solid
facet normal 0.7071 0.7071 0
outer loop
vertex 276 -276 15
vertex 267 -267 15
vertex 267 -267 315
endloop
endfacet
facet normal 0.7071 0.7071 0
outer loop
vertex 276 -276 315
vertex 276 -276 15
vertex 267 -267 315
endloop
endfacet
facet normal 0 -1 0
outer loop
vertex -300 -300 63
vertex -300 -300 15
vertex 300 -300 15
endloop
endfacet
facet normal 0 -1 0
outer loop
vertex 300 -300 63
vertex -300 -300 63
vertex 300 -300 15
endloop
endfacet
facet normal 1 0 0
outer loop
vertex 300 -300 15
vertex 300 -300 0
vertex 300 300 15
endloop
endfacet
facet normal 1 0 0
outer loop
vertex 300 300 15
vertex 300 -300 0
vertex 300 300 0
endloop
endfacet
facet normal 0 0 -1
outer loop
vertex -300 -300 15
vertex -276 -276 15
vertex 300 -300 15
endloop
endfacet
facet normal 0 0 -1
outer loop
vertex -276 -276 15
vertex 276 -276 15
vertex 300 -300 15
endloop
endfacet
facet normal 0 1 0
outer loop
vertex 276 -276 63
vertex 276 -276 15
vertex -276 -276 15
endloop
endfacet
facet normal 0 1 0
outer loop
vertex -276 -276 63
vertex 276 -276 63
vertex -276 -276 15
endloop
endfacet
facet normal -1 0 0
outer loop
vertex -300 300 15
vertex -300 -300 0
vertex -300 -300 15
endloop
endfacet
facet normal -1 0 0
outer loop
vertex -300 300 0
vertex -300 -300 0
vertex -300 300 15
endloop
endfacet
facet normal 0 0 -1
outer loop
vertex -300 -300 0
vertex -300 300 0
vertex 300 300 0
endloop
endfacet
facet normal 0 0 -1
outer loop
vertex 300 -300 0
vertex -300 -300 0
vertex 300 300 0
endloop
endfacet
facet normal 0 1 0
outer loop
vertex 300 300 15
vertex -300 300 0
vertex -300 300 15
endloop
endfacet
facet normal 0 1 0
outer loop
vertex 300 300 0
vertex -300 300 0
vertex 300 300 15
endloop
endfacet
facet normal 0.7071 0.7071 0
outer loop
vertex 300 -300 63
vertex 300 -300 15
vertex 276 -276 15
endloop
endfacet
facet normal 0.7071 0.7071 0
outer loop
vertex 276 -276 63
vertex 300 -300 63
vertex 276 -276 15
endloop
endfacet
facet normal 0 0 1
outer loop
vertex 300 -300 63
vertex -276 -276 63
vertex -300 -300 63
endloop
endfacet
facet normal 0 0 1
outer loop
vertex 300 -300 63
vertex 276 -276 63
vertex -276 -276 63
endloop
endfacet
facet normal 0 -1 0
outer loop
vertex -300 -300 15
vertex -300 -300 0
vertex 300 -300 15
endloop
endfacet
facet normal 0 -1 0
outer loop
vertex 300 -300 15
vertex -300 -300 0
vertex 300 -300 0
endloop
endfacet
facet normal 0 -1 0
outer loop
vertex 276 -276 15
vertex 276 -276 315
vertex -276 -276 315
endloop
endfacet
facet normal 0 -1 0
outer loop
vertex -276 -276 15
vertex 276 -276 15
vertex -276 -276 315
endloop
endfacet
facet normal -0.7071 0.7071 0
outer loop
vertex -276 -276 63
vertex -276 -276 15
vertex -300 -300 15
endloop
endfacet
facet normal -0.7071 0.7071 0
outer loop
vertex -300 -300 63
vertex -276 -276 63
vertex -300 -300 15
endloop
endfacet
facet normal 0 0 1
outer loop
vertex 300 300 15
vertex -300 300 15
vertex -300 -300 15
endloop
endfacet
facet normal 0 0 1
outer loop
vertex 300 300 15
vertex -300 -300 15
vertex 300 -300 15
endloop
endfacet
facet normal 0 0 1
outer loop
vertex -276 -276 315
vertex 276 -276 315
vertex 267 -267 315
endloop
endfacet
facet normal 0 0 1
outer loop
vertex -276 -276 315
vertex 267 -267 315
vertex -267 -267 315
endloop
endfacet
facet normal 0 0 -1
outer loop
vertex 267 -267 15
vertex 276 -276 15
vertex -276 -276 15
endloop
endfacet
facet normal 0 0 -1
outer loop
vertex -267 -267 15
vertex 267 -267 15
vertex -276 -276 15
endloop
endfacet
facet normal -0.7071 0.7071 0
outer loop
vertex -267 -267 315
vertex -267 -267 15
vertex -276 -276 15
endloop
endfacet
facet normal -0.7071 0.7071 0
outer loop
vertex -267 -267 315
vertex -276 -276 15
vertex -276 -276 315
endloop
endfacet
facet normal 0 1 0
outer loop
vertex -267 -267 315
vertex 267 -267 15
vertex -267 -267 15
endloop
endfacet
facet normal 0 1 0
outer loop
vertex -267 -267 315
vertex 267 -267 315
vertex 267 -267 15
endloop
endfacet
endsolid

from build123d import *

# Parameters (mm, degrees)
F0_W     = 600
F0_H     = 600
F1_DEPTH = 15
F3_DEPTH = 48
F4_W     = 552
F4_H     = 300
F5_DEPTH = 9
F6_SIZE  = 8.99999


# Not quite as in the source:
# - a fillet or chamfer is up to 0.001 mm smaller than in the source, because OpenCascade refuses the exact size


with BuildPart() as f1:
    # F0 (on Top) → F1 (new body)
    with BuildSketch(Plane.XY):
        Rectangle(F0_W, F0_H)
    extrude(amount=F1_DEPTH)


with BuildPart() as f3:
    # F2 (on face) → F3 (new body)
    with BuildSketch(Plane.XY.offset(15)):
        Polygon((-276, -276), (-300, -300), (300, -300), (276, -276), align=None)
    extrude(amount=F3_DEPTH)


with BuildPart() as f5:
    # F4 (on face) → F5 (new body)
    with BuildSketch(Plane(origin=(0, -276, 0), x_dir=(-1, 0, 0), z_dir=(0, 1, 0))):
        with Locations((0, 165)):
            Rectangle(F4_W, F4_H)
    extrude(amount=F5_DEPTH)

    # F6 (size 9 in the source; OpenCascade refuses exactly that, so slightly less here)
    f6_edges = [f5.edges().sort_by_distance(p)[0] for p in [
        (276, -267, 165),
        (-276, -267, 165),
    ]]
    chamfer(f6_edges, length=F6_SIZE)


solid = Compound([f1.part, f3.part, f5.part])
